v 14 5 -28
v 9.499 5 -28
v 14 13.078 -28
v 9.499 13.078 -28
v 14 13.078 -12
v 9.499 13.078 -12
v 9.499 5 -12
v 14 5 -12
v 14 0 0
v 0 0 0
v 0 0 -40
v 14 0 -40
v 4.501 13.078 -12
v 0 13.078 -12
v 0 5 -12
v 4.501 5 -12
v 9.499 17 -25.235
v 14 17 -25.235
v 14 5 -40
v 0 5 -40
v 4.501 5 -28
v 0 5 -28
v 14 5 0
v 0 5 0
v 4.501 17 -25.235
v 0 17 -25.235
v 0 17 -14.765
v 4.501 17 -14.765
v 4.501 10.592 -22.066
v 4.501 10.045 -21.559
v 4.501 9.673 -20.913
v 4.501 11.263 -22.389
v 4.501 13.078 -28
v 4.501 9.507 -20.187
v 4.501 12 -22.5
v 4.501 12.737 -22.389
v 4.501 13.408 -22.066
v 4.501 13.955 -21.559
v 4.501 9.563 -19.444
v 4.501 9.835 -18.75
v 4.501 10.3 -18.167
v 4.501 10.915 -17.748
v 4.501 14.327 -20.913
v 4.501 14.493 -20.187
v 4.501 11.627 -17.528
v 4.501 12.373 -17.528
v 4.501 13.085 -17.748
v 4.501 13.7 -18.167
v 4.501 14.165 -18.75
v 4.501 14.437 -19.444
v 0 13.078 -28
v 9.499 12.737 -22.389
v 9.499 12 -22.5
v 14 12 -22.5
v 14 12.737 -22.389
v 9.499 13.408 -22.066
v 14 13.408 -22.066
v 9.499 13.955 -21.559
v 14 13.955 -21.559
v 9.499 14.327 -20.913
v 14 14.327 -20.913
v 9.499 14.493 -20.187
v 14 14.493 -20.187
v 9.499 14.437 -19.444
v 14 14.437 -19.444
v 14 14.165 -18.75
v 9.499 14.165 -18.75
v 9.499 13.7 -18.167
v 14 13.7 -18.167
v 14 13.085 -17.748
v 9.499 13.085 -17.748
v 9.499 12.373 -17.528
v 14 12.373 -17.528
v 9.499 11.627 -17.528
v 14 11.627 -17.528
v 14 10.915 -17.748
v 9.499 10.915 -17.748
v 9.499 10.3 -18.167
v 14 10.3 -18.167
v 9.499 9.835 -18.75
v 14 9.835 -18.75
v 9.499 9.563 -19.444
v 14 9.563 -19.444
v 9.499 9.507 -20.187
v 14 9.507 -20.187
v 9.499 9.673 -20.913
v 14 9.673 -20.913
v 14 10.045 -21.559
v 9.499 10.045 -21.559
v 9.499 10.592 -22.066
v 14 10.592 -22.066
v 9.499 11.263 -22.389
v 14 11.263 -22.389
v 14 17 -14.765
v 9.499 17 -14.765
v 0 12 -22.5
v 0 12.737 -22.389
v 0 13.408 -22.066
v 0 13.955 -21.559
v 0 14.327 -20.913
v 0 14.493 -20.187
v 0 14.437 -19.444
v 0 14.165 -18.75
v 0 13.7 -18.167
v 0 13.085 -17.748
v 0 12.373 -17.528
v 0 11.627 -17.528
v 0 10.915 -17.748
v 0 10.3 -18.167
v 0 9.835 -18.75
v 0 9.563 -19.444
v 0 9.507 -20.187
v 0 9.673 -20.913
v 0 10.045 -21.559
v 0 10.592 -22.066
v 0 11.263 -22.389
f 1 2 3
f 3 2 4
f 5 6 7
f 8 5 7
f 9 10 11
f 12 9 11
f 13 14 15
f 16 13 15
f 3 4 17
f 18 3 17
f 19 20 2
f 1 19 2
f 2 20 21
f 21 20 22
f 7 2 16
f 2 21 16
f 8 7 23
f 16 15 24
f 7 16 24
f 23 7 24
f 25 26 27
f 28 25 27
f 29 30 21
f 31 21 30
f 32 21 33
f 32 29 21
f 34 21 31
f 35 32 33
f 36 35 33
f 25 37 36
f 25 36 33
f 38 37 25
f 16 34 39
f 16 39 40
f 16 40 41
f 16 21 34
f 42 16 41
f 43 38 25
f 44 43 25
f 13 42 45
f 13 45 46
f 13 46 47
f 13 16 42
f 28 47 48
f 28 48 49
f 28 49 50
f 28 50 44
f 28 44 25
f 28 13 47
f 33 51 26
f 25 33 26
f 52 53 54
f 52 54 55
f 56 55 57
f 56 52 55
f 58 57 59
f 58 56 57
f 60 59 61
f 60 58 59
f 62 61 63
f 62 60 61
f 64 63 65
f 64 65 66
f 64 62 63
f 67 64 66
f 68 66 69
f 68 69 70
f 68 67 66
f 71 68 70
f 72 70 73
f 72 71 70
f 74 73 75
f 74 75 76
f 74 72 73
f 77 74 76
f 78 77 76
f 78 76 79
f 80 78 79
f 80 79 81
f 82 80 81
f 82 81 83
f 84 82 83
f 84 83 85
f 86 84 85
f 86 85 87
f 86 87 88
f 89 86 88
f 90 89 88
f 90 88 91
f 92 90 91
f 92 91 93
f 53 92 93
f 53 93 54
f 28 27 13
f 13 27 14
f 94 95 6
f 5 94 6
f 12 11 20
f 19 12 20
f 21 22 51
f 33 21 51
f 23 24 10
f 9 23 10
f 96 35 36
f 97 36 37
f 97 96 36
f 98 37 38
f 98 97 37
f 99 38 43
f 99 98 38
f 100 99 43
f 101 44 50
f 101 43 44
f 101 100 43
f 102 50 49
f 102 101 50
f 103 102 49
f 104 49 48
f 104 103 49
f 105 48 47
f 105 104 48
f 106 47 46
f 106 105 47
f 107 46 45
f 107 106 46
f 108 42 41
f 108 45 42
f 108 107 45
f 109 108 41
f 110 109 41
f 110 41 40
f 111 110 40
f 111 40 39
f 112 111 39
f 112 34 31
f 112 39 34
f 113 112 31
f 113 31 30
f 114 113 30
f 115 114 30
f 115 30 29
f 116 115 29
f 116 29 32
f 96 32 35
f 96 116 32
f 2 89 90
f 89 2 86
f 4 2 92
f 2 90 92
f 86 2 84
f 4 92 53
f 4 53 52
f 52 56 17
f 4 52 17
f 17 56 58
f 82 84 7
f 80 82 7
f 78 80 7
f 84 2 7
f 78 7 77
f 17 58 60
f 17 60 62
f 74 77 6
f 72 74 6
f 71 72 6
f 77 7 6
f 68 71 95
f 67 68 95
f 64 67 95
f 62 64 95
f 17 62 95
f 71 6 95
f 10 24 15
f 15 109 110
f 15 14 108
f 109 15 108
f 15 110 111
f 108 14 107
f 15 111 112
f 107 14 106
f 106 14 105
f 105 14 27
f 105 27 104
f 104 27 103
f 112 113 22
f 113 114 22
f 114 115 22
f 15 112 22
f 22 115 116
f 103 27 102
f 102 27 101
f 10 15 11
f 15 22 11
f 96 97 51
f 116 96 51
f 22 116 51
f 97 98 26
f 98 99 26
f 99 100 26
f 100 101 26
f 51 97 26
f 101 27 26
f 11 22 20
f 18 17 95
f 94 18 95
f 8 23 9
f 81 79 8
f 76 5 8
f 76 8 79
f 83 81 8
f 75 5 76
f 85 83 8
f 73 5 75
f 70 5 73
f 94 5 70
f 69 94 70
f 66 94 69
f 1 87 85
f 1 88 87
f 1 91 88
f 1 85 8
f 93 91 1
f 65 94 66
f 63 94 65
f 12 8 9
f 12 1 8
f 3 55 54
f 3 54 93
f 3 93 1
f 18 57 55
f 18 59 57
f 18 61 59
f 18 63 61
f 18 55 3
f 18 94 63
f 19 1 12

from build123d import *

# Parameters (mm, degrees)
SKETCH_2_R          = 2.5
EXTRUDE_1_DEPTH     = 14
SKETCH_3_W          = 4.998687722
SKETCH_3_H          = 24
CUT_EXTRUDE_2_DEPTH = 16


with BuildPart() as part:
    # Эскиз2 → Вытянуть1 (new body)
    with BuildSketch(Plane(origin=(0, 0, 0), x_dir=(0, 0, -1), z_dir=(1, 0, 0))):
        Polygon((0, 0), (40, 0), (40, 5), (28, 5), (28, 13.077507284), (25.234860189, 17), (14.765139811, 17), (12, 13.077507284), (12, 5), (0, 5), align=None)
        with Locations((20, 12)):
            Circle(SKETCH_2_R, mode=Mode.SUBTRACT)
    extrude(amount=EXTRUDE_1_DEPTH)

    # Эскиз3 → Вытянуть2 (cut)
    with BuildSketch(Plane.XY.offset(-12)):
        with Locations((7, 17)):
            Rectangle(SKETCH_3_W, SKETCH_3_H)
    extrude(amount=-CUT_EXTRUDE_2_DEPTH, mode=Mode.SUBTRACT)


solid = part.part
